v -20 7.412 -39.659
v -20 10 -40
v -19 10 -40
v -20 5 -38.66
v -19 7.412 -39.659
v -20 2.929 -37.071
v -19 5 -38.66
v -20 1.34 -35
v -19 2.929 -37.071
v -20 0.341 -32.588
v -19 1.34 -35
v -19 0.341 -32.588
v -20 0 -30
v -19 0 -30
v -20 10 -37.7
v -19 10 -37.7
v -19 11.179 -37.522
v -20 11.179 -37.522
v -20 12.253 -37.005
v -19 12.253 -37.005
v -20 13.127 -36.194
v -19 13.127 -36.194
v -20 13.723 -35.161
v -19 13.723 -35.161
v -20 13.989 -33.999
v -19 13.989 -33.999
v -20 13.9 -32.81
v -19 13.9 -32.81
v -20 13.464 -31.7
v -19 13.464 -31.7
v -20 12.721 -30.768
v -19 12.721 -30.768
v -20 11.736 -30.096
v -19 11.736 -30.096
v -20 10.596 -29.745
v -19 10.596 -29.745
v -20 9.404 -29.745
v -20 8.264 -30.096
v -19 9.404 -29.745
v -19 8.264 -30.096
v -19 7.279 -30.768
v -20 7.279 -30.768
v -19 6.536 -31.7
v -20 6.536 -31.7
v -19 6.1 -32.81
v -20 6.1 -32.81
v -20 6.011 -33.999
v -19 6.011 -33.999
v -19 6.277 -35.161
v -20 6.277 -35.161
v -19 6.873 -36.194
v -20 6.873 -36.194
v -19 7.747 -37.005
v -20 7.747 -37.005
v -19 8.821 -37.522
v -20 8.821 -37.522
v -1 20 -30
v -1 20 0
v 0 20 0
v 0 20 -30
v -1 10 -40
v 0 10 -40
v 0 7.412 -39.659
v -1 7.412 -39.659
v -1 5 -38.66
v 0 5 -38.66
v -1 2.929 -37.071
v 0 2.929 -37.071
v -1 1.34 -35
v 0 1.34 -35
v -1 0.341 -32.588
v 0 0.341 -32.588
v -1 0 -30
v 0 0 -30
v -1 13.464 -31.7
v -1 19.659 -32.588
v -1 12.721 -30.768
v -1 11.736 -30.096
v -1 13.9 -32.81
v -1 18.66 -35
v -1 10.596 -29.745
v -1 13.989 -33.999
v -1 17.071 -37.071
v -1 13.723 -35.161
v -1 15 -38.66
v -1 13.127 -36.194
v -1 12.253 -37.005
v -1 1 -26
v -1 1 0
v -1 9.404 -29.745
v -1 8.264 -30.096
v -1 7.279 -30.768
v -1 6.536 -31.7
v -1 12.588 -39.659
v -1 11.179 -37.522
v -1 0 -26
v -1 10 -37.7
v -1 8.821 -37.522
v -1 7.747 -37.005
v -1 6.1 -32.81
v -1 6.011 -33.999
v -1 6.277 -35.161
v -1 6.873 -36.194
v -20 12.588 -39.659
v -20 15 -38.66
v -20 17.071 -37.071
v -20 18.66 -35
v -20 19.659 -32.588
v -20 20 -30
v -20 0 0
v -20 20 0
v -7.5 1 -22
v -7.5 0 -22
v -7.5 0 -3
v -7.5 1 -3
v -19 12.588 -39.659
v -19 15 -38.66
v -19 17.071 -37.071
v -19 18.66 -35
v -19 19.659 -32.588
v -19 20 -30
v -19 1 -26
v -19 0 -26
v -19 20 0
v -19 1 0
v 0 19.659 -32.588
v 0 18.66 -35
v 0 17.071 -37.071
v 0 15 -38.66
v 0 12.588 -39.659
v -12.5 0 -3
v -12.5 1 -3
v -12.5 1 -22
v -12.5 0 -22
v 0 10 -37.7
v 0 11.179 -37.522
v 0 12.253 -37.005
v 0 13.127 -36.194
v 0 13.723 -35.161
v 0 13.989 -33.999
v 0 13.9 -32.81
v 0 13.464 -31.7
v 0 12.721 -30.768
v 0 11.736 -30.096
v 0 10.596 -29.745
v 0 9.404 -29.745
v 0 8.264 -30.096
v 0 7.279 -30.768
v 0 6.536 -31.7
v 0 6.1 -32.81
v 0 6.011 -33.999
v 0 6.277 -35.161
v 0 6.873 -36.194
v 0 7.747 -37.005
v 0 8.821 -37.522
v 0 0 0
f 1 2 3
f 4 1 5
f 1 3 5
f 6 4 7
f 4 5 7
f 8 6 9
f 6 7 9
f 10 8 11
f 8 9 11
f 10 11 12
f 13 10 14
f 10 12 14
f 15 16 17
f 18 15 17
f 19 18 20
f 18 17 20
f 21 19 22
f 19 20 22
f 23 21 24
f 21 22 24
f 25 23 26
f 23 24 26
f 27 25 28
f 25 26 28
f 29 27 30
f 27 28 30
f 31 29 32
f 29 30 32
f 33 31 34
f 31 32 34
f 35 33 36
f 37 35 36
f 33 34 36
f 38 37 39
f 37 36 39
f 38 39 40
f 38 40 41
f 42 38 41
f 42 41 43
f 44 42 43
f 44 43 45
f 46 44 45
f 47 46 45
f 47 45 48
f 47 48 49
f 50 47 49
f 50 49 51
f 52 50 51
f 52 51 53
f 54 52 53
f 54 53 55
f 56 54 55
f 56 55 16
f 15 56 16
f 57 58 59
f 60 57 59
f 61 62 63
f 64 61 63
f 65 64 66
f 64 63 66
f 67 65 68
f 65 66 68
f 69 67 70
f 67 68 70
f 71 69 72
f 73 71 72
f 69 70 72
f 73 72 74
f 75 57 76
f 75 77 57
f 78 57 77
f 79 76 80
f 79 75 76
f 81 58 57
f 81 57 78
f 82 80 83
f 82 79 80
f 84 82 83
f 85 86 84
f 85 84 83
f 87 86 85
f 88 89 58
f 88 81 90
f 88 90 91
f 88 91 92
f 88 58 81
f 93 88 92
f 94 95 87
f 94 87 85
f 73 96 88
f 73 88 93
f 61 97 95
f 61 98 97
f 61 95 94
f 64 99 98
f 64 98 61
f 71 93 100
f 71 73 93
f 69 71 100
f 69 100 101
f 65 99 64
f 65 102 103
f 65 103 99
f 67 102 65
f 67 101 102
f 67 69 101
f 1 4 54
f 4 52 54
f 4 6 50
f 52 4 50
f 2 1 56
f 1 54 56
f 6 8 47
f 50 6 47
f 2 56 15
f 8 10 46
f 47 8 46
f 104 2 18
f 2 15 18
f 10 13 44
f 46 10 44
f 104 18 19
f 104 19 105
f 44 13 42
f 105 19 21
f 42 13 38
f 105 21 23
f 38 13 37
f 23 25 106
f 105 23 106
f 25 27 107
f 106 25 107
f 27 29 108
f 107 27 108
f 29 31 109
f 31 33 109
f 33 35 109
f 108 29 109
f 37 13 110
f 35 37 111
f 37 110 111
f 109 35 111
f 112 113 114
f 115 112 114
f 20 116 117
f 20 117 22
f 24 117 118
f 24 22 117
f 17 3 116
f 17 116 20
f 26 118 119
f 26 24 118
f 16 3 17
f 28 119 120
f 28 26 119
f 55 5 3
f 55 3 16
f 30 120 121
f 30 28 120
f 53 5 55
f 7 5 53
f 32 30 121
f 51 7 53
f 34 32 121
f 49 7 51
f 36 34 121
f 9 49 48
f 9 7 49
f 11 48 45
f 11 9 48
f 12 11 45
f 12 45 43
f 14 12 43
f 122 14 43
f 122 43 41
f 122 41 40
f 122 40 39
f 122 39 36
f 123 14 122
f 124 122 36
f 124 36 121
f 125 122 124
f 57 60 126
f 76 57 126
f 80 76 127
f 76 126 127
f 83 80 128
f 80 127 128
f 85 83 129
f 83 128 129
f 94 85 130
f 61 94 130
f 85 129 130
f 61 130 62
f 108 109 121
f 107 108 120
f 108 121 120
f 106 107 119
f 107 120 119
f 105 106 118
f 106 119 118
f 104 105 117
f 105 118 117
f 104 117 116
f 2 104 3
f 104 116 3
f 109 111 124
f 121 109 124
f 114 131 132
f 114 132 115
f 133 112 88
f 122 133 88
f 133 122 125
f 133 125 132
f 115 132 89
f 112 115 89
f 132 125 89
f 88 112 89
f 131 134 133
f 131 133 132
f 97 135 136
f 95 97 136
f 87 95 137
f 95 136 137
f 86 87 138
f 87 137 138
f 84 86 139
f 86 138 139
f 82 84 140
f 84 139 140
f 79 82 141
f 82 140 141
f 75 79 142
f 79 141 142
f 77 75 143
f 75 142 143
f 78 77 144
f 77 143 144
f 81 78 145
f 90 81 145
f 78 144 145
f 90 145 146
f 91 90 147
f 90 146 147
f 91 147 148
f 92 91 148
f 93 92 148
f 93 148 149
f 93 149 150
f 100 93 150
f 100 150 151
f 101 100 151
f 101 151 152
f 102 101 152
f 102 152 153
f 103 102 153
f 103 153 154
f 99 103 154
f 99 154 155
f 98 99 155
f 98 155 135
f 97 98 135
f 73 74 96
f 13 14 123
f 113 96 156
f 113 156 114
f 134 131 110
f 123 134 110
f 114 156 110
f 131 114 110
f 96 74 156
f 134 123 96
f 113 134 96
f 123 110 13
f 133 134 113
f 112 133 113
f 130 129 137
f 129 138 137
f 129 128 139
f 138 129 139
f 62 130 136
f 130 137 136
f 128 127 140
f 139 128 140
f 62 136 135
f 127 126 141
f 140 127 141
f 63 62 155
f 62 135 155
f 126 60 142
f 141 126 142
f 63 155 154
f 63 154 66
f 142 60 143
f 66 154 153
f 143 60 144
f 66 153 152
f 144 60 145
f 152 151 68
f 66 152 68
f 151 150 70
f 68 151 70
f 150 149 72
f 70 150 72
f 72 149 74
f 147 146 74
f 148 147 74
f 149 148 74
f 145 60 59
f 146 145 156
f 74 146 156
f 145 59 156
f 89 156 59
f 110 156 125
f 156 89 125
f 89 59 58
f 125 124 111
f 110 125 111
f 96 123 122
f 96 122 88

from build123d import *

# Parameters (mm, degrees)
SALIENTE_EXTRUIR1_DEPTH = 40
CORTAR_EXTRUIR1_DEPTH   = 40
CROQUIS3_R              = 4
CORTAR_EXTRUIR2_DEPTH   = 40
CORTAR_EXTRUIR3_DEPTH   = 40
CROQUIS5_W              = 5
CROQUIS5_H              = 19
CORTAR_EXTRUIR4_DEPTH   = 40


with BuildPart() as part:
    # Croquis1 → Saliente-Extruir1 (new body)
    with BuildSketch(Plane.XY):
        Polygon((0, 0), (-20, 0), (-20, 20), (-19, 20), (-19, 1), (-1, 1), (-1, 20), (0, 20), align=None)
    extrude(amount=-SALIENTE_EXTRUIR1_DEPTH)

    # Croquis2 → Cortar-Extruir1 (cut)
    with BuildSketch(Plane(origin=(0, 0, 0), x_dir=(0, 0, -1), z_dir=(1, 0, 0))):
        with BuildLine():
            ThreePointArc((30, 20), (37.071067812, 17.071067812), (40, 10))
            Line((40, 10), (40, 20))
            Line((40, 20), (30, 20))
        make_face()
        with BuildLine():
            Line((40, 0), (40, 10))
            ThreePointArc((40, 10), (37.071067812, 2.928932188), (30, 0))
            Line((30, 0), (40, 0))
        make_face()
    extrude(amount=-CORTAR_EXTRUIR1_DEPTH, mode=Mode.SUBTRACT)

    # Croquis3 → Cortar-Extruir2 (cut)
    with BuildSketch(Plane(origin=(0, 0, 0), x_dir=(0, 0, -1), z_dir=(1, 0, 0))):
        with Locations((33.7, 10)):
            Circle(CROQUIS3_R)
    extrude(amount=-CORTAR_EXTRUIR2_DEPTH, mode=Mode.SUBTRACT)

    # Croquis4 → Cortar-Extruir3 (cut)
    with BuildSketch(Plane(origin=(0, 0, 0), x_dir=(-1, 0, 0), z_dir=(0, -1, 0))):
        Polygon((19, 26), (1, 26), (1, 34.358898944), (9.832157659, 34.358898944), (19, 34.358898944), align=None)
    extrude(amount=-CORTAR_EXTRUIR3_DEPTH, mode=Mode.SUBTRACT)

    # Croquis5 → Cortar-Extruir4 (cut)
    with BuildSketch(Plane.XZ):
        with Locations((-10, -12.5)):
            Rectangle(CROQUIS5_W, CROQUIS5_H)
    extrude(amount=-CORTAR_EXTRUIR4_DEPTH, mode=Mode.SUBTRACT)


solid = part.part
